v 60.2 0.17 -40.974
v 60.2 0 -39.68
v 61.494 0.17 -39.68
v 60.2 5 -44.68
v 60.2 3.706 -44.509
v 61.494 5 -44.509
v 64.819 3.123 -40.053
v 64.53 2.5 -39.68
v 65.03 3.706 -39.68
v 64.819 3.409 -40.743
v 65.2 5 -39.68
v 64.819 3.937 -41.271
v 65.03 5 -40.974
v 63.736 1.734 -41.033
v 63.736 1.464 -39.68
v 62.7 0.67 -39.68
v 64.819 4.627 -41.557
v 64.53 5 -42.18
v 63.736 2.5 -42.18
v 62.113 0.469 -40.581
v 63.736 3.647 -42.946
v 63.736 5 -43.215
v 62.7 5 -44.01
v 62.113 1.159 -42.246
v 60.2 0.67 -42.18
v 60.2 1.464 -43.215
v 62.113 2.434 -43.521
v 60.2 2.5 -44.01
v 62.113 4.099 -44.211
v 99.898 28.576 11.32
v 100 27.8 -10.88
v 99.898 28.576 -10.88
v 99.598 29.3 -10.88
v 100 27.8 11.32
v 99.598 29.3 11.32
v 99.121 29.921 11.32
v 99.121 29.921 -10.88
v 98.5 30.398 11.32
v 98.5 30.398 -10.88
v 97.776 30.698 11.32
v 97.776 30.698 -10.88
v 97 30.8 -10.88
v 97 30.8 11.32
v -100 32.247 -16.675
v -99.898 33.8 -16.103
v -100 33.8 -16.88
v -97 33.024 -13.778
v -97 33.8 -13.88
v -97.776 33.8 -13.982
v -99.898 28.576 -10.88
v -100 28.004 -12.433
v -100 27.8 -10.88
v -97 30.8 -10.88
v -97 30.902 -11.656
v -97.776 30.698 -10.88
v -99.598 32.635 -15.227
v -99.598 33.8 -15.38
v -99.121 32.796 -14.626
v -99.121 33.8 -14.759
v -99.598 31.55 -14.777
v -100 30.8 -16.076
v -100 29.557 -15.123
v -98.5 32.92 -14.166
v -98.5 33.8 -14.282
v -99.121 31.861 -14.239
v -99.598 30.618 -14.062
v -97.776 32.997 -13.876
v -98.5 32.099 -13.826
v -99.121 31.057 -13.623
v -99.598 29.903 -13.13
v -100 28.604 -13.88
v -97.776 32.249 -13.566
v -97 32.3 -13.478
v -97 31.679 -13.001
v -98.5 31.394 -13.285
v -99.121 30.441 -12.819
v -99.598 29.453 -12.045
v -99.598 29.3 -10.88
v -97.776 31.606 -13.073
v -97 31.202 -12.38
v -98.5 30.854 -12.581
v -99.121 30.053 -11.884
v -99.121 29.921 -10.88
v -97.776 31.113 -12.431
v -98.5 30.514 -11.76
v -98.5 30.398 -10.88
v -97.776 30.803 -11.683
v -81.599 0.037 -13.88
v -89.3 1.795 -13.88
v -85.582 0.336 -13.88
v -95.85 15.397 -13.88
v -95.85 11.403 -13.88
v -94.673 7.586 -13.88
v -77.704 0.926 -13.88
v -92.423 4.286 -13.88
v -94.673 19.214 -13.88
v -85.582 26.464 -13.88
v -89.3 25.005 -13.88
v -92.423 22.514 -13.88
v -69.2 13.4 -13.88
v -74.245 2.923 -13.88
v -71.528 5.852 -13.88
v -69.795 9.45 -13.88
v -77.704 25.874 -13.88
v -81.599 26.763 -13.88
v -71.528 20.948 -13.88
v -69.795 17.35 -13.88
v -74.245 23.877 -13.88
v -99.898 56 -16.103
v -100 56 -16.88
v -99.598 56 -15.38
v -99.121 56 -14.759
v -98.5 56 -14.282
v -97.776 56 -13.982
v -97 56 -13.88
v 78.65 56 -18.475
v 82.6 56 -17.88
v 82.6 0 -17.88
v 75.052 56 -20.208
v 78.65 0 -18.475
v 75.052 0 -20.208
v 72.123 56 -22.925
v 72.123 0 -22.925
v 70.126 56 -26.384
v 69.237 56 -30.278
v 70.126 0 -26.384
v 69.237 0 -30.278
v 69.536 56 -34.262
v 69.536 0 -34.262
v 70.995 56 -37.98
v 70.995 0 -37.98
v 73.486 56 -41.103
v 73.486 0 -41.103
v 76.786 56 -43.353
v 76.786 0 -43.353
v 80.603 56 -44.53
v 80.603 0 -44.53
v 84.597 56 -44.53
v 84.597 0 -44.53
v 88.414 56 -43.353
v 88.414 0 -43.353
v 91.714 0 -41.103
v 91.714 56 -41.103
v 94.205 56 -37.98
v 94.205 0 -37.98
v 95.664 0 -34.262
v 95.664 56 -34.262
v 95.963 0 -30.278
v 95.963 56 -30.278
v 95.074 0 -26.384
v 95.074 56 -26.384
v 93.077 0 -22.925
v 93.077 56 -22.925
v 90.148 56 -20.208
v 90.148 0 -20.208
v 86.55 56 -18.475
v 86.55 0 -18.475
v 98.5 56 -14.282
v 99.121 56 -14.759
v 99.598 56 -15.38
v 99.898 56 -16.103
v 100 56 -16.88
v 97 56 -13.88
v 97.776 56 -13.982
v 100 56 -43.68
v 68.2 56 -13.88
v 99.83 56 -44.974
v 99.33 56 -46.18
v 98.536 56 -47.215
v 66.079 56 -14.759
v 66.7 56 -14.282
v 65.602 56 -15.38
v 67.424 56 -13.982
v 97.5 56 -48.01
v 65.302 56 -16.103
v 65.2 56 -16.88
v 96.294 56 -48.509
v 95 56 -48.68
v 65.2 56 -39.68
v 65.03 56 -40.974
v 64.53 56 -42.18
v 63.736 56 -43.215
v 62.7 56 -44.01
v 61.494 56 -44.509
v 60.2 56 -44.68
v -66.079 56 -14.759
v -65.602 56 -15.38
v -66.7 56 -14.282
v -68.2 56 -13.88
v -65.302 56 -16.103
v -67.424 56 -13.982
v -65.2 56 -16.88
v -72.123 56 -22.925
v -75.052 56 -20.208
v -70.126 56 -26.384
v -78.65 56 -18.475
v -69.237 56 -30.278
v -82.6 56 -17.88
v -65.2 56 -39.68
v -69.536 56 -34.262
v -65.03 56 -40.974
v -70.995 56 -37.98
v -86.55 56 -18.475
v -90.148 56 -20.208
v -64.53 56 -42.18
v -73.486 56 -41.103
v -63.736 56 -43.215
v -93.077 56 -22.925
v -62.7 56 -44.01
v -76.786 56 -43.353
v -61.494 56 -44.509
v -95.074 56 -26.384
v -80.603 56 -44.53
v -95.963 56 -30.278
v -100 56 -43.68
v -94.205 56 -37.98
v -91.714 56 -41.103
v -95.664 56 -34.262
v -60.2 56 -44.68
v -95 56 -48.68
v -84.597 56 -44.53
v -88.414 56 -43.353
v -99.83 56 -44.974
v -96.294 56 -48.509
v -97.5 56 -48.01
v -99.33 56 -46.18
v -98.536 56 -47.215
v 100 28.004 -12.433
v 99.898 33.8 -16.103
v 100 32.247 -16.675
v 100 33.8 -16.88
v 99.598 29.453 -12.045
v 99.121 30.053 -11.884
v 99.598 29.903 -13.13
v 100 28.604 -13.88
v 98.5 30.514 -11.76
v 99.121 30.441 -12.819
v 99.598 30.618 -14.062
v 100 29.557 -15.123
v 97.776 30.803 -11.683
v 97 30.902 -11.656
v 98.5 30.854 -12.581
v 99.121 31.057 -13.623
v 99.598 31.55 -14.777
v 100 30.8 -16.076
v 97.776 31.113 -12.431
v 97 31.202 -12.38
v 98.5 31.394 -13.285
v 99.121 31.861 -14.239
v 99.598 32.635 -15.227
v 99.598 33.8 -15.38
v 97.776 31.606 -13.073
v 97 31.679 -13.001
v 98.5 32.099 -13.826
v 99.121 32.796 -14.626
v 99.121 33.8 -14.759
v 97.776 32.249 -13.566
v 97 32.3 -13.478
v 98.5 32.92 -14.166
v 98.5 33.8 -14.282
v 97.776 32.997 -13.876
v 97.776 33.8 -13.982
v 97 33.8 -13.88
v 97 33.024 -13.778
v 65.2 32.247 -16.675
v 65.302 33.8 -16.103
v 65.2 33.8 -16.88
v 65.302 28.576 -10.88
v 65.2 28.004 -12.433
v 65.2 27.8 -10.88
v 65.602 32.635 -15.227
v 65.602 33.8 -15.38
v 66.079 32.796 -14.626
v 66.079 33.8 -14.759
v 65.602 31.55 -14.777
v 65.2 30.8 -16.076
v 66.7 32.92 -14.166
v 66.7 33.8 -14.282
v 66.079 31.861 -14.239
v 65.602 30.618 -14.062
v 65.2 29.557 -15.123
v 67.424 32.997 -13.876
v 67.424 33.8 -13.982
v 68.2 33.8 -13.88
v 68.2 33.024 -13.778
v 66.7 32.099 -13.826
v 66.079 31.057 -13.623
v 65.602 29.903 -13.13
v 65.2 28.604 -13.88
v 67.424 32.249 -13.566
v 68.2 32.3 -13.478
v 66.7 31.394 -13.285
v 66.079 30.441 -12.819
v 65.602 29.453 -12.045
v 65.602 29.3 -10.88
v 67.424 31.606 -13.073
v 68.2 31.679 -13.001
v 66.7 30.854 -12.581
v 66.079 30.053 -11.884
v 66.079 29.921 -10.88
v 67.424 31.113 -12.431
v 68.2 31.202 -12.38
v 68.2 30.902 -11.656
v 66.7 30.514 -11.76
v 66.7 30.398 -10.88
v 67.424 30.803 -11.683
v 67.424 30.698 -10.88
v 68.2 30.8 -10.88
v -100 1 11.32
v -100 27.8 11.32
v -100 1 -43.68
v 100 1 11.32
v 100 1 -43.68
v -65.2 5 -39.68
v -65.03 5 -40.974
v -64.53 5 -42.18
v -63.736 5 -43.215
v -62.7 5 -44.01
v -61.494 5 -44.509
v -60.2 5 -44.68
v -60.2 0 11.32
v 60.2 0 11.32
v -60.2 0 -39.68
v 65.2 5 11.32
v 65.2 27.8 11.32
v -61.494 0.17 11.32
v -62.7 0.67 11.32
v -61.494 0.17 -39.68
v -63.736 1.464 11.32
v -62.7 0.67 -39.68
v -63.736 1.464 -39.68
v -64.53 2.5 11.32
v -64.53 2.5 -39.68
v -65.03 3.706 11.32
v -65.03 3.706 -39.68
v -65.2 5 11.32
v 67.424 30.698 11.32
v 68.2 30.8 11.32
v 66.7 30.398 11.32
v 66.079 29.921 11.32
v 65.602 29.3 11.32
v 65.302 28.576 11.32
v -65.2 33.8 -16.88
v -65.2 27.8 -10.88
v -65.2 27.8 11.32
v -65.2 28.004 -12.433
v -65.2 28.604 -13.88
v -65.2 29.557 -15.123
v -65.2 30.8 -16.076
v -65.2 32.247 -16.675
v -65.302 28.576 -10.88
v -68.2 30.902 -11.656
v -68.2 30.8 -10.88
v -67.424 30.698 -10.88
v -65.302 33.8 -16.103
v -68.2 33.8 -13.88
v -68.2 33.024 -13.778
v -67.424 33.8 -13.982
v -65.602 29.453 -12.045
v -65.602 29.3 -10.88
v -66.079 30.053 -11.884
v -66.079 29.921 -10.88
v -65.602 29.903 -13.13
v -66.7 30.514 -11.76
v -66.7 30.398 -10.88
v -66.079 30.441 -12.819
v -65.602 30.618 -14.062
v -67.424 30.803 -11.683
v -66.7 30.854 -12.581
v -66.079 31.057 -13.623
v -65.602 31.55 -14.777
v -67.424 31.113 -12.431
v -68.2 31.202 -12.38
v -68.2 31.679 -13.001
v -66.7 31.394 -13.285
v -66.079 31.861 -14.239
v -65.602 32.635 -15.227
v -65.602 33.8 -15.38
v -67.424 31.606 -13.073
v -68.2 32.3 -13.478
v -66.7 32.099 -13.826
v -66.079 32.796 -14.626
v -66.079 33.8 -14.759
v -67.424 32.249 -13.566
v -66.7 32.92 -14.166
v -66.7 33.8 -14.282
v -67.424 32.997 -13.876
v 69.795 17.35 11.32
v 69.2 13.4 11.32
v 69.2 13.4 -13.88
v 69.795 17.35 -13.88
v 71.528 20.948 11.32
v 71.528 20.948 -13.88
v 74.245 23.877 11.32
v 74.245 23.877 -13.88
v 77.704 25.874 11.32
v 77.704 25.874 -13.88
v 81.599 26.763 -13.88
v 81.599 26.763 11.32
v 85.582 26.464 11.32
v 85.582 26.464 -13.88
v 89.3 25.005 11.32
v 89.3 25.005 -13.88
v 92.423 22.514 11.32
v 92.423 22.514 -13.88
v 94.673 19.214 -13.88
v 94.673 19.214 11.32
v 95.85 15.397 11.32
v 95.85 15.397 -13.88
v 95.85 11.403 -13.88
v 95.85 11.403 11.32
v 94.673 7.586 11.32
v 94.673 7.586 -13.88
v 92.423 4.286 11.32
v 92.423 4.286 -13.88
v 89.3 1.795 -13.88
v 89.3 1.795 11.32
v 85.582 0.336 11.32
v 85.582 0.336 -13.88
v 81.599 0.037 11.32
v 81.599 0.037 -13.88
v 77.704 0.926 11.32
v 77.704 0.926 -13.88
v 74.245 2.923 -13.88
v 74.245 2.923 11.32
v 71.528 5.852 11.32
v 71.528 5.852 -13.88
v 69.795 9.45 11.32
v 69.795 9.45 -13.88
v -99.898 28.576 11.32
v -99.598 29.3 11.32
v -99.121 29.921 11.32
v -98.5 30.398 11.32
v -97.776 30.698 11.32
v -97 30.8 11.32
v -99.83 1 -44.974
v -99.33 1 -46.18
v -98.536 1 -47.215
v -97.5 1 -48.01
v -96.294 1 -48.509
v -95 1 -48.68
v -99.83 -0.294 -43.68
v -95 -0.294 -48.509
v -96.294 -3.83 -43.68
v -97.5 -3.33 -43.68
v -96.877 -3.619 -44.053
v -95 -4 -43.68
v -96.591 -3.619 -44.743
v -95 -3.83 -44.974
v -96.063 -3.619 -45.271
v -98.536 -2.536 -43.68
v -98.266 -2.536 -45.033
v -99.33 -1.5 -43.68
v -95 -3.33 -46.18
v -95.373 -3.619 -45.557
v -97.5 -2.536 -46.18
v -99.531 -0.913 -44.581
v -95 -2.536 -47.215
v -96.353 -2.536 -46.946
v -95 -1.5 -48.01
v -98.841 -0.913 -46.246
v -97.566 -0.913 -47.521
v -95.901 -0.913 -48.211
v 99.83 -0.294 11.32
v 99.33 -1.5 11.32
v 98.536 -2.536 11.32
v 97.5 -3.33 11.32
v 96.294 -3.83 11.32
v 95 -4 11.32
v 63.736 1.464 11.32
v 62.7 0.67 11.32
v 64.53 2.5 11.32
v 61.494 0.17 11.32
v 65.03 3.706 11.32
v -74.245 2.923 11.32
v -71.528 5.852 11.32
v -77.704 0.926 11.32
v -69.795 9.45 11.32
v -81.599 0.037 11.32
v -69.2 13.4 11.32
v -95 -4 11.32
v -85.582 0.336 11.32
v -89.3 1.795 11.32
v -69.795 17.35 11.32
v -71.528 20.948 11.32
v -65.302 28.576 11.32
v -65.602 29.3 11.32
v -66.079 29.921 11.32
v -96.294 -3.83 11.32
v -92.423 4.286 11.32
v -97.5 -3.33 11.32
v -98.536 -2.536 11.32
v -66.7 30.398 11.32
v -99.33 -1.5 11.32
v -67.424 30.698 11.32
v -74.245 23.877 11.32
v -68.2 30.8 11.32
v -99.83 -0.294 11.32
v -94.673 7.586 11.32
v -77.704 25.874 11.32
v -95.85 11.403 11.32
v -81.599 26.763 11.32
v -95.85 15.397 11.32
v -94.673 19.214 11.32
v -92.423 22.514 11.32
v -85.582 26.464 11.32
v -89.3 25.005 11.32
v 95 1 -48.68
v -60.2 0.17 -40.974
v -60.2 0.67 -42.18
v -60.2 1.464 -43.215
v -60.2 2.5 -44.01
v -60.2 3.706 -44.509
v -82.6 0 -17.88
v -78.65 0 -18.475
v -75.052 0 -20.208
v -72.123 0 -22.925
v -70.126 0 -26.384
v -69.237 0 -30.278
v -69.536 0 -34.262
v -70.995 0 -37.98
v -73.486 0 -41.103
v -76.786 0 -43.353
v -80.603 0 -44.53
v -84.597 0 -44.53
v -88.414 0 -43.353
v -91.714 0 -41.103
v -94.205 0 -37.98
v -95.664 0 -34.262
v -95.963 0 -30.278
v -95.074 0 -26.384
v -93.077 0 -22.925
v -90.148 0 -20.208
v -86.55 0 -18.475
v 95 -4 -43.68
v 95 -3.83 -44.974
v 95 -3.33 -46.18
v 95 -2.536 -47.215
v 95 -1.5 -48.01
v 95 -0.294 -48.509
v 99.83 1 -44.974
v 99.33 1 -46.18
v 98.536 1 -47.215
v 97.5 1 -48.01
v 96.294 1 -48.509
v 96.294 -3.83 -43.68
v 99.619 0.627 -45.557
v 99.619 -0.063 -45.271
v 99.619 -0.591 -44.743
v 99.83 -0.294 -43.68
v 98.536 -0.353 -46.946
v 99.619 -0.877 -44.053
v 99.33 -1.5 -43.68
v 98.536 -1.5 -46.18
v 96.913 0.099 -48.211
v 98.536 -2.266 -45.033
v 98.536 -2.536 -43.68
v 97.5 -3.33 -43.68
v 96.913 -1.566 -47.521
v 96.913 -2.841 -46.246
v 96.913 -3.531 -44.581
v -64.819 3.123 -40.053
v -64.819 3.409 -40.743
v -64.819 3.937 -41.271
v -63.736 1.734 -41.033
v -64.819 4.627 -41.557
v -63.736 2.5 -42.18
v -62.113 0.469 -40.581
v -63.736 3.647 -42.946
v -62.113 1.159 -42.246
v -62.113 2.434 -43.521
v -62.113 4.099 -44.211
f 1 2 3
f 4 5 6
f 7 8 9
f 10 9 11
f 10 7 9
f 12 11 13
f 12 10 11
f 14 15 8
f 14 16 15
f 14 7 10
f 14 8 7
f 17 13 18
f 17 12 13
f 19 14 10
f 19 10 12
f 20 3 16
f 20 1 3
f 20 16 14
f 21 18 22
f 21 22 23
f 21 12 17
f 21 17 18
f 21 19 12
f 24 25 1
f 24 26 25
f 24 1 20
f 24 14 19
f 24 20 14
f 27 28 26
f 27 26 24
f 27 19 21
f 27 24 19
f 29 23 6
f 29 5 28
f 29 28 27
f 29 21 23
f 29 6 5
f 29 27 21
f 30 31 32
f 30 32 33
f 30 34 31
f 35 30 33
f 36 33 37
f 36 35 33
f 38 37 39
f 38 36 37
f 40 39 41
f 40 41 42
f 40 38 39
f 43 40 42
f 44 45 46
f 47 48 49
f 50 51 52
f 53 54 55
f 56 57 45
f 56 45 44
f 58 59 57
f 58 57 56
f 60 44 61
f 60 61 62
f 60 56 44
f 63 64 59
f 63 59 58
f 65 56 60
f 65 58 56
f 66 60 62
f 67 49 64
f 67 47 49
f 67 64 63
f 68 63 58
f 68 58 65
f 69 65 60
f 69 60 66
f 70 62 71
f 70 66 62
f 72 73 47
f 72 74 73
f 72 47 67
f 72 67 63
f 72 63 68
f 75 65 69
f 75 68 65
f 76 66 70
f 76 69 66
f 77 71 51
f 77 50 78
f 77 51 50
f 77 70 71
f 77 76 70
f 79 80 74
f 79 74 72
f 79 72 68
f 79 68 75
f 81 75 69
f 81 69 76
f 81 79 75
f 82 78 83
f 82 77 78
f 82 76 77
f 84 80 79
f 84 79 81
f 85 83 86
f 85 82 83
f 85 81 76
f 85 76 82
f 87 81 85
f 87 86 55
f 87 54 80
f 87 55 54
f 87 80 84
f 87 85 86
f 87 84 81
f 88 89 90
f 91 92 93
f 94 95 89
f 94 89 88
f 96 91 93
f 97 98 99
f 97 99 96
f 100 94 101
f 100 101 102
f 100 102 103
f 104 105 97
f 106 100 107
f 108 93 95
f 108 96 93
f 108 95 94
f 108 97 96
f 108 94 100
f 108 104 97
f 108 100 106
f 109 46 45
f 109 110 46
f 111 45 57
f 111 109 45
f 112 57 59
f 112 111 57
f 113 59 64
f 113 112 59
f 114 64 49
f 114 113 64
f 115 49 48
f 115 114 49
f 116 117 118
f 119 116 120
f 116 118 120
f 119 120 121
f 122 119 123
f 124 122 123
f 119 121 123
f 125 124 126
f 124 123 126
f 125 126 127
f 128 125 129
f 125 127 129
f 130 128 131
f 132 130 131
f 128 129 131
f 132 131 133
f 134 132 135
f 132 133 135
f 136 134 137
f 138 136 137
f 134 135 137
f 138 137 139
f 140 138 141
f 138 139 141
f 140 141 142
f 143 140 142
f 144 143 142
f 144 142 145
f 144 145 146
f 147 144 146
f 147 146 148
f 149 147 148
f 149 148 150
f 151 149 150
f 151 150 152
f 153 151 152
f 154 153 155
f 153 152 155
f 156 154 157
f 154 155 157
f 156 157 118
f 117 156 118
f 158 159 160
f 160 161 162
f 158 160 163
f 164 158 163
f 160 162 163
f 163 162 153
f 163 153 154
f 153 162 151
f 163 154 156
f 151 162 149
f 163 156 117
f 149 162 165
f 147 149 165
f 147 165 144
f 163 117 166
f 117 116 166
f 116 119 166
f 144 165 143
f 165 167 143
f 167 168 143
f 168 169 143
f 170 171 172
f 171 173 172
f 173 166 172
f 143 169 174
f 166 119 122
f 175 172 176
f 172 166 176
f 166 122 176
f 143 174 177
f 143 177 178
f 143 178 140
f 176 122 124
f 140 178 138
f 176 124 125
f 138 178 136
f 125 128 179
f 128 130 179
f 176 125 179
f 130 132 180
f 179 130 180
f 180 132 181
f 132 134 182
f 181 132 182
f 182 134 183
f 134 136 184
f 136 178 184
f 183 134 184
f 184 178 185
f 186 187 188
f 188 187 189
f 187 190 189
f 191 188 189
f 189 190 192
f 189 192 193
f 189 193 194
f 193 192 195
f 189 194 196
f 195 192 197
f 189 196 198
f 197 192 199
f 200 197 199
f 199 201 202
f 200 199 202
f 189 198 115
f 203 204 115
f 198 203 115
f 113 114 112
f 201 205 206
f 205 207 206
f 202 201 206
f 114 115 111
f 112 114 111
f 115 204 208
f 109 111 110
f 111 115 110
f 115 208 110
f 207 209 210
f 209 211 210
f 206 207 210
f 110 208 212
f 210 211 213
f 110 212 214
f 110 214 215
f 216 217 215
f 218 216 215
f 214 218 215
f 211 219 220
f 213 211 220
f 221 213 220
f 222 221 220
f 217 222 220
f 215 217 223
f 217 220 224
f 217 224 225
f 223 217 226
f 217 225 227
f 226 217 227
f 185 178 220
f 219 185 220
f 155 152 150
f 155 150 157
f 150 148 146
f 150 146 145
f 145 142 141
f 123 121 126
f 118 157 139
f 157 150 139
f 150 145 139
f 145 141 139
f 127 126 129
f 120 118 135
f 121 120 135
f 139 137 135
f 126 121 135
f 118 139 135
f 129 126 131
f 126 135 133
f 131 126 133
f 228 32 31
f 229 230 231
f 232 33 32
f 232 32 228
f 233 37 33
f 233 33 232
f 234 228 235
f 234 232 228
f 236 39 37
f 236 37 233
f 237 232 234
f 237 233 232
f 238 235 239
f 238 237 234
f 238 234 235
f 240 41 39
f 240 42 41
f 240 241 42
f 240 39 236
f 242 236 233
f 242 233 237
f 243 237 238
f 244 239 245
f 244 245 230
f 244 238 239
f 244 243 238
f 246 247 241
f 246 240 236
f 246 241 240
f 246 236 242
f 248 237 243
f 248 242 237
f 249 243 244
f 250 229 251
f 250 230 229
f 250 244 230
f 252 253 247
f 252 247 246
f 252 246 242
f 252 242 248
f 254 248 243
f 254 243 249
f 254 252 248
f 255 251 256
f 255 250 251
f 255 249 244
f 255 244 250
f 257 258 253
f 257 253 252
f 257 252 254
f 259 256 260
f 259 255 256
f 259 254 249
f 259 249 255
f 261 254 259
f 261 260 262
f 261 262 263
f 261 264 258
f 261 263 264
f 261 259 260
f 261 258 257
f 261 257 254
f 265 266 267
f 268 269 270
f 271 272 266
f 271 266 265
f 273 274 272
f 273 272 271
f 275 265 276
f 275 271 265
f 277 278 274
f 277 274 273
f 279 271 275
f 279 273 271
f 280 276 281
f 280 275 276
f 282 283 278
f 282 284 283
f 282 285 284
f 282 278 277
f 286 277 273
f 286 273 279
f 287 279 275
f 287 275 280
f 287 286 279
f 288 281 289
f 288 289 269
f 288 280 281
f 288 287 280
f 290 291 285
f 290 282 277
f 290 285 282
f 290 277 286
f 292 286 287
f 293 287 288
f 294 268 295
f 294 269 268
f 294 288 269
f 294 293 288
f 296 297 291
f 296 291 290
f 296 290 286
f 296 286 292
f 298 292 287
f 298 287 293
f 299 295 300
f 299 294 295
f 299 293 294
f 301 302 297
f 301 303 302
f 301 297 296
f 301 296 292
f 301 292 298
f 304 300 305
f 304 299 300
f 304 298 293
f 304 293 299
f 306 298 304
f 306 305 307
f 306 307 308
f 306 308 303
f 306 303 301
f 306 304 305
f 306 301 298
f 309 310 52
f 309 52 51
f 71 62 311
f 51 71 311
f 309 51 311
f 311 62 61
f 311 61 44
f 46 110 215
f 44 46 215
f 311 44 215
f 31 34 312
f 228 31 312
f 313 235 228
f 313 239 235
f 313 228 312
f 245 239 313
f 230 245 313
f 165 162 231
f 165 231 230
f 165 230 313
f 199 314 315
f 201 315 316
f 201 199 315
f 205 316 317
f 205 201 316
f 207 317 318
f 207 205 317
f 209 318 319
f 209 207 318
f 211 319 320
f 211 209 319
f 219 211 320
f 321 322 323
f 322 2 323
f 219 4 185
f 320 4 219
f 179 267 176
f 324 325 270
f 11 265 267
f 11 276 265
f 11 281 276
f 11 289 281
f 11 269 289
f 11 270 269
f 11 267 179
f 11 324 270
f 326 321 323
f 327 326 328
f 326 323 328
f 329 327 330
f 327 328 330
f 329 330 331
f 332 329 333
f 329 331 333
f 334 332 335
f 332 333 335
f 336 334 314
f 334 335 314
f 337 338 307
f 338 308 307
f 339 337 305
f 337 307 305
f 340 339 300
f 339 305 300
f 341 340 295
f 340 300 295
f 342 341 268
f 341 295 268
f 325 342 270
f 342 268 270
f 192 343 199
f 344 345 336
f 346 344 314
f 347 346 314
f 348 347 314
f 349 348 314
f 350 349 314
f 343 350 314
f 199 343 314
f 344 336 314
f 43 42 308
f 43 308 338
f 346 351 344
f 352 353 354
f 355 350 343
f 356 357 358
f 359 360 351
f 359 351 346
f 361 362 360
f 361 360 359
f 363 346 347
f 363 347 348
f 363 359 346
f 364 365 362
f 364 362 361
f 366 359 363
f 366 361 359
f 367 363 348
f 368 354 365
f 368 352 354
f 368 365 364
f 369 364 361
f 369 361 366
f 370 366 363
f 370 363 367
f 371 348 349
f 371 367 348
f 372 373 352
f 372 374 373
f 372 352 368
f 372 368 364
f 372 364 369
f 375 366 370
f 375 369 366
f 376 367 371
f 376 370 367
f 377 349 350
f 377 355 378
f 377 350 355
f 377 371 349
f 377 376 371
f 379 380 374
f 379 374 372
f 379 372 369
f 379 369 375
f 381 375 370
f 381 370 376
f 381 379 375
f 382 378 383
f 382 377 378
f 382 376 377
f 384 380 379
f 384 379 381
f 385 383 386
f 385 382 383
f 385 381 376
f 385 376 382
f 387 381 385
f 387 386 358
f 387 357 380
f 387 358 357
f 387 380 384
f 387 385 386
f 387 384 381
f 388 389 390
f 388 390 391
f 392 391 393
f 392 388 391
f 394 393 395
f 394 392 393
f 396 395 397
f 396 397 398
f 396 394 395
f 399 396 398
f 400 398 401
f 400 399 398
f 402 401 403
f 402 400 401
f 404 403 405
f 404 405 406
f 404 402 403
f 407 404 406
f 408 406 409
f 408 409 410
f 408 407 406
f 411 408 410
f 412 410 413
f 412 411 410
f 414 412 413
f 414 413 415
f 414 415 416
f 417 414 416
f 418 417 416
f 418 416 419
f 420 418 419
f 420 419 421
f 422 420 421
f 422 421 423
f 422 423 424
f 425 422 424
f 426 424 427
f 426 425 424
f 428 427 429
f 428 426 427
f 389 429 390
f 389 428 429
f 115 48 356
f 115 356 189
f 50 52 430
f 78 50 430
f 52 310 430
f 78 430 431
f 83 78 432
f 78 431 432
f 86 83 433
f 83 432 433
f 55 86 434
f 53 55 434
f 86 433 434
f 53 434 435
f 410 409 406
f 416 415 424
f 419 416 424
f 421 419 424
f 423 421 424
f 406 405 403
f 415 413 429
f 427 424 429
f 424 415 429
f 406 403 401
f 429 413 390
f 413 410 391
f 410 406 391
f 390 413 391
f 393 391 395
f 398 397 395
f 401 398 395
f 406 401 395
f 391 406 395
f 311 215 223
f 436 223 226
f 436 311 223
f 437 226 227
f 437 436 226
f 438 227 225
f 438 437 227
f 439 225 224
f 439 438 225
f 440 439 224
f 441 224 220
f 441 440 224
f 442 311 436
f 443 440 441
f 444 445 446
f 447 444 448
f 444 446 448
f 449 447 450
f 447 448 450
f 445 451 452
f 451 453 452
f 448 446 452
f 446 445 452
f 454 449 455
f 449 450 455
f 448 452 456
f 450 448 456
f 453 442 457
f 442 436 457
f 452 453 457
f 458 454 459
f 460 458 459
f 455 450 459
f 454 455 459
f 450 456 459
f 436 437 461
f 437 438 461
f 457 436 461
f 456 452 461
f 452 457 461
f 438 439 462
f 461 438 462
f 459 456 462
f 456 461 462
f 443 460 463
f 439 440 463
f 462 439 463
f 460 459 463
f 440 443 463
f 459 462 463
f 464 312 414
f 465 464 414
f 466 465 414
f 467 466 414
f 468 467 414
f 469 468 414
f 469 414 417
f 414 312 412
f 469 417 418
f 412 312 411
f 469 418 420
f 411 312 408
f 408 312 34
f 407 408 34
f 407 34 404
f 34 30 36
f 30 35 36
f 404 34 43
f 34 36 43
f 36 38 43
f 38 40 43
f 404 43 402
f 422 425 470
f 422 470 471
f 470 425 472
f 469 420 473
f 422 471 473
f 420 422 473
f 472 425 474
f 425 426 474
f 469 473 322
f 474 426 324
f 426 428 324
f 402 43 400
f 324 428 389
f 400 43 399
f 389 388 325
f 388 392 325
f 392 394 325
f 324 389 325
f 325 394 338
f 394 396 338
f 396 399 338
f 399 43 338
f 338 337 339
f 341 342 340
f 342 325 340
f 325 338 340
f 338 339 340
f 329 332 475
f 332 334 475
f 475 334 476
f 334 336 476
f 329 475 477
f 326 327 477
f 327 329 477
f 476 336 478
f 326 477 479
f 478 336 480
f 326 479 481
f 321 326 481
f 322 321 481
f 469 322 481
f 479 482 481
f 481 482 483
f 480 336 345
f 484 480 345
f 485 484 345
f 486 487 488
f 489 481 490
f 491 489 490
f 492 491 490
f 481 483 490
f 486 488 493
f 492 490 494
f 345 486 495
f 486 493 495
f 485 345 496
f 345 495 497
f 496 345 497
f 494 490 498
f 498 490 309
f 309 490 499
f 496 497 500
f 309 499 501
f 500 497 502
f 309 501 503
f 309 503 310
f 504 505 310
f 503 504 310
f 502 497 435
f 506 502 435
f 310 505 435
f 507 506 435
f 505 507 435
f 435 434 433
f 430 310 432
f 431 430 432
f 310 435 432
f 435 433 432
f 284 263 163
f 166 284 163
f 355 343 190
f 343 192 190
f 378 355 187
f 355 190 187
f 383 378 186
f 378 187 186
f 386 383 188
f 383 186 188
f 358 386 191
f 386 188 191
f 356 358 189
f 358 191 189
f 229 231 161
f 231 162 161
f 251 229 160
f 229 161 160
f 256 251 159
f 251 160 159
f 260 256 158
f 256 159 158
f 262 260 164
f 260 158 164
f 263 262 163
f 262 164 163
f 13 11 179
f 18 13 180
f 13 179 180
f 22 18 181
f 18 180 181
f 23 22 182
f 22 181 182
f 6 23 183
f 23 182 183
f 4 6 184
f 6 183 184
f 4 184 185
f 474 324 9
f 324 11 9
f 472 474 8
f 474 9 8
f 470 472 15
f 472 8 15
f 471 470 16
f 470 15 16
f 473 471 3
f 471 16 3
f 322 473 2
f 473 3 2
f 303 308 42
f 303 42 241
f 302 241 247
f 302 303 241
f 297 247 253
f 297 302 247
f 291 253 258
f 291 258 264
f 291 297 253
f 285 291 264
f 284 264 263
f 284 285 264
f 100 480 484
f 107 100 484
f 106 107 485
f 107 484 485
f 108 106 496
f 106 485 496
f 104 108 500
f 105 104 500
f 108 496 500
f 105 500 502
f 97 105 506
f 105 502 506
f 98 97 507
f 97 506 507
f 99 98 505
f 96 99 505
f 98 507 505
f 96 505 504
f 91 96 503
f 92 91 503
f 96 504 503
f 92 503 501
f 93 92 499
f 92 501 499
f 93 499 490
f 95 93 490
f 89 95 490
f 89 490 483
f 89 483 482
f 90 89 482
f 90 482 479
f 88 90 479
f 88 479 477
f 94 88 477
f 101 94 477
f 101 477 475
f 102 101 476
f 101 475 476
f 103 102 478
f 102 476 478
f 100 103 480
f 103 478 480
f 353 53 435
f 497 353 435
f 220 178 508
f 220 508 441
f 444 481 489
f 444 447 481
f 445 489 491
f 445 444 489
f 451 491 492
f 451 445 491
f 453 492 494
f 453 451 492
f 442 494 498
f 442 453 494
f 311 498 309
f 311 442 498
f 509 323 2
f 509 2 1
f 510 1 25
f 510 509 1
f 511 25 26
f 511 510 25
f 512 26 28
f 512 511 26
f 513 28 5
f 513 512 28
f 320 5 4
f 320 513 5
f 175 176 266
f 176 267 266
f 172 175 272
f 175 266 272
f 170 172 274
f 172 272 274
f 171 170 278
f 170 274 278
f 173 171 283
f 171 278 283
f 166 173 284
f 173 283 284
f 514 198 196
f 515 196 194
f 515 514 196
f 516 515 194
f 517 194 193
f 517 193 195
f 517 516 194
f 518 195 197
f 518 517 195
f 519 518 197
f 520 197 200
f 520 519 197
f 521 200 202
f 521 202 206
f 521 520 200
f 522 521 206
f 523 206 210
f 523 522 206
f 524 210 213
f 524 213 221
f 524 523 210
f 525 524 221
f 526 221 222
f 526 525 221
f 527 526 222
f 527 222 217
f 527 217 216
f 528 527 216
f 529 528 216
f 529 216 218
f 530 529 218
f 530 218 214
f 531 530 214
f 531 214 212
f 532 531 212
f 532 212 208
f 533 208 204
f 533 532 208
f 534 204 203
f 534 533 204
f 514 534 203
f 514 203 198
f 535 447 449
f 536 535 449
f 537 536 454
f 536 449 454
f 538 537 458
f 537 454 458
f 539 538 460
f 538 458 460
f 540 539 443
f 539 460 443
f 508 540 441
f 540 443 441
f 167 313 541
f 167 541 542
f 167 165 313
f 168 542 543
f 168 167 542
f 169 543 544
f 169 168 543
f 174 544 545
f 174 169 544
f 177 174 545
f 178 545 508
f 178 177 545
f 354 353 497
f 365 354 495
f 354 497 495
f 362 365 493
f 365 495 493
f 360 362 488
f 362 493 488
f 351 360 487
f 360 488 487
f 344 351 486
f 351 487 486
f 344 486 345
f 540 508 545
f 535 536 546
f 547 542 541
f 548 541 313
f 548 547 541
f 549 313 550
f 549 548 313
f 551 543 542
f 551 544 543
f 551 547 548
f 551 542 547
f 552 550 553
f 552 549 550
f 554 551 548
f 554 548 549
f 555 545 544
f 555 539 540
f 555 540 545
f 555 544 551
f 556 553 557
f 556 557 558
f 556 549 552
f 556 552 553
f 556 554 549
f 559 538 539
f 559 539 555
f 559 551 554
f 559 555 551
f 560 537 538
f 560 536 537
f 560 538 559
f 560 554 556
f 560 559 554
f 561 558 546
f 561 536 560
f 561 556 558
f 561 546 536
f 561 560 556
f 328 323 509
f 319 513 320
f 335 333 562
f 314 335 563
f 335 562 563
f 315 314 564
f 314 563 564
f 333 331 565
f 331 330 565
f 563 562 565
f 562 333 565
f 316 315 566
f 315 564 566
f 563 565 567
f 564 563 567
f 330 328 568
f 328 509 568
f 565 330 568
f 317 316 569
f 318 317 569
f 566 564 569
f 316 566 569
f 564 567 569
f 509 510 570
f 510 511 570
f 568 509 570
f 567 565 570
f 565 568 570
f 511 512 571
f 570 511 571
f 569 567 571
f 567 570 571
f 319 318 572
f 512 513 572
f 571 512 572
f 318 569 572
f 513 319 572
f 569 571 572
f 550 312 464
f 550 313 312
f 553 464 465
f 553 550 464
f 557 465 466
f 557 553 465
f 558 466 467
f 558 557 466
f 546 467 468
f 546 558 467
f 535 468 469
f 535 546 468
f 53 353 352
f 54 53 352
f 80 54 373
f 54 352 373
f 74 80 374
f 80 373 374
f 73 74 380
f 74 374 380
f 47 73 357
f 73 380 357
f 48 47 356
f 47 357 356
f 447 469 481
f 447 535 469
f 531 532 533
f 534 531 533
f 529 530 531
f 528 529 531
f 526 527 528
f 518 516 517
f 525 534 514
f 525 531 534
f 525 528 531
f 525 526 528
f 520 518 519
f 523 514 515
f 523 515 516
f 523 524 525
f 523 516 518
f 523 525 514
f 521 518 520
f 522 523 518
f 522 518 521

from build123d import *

# Parameters (mm, degrees)
SKETCH1_R           = 13.4
BOSS_EXTRUDE1_DEPTH = 56
SKETCH2_W           = 100
SKETCH2_H           = 60
BOSS_EXTRUDE2_DEPTH = 4
SKETCH3_R           = 13.4
CUT_EXTRUDE1_DEPTH  = 25.2
SKETCH4_W           = 25.2
SKETCH4_H           = 25.2
CUT_EXTRUDE2_DEPTH  = 51.2
FILLET1_R           = 5
FILLET2_R           = 5
FILLET4_R           = 3
FILLET5_R           = 3


with BuildPart() as part:
    # Sketch1 → Boss-Extrude1 (new body)
    with BuildSketch(Plane(origin=(0, 0, 0), x_dir=(1, 0, 0), z_dir=(0, 1, 0))):
        Polygon((-65.2, -11.320132013), (-65.2, 44.679867987), (0, 44.679867987), (0, 48.679867987), (-100, 48.679867987), (-100, -11.320132013), align=None)
        with Locations(Location((-82.6, 31.279867987, 0), (0, 0, 270))):
            Circle(SKETCH1_R, mode=Mode.SUBTRACT)
    boss_extrude1 = extrude(amount=BOSS_EXTRUDE1_DEPTH)

    # Sketch2 → Boss-Extrude2 (add)
    with BuildSketch(Plane(origin=(0, 0, 0), x_dir=(1, 0, 0), z_dir=(0, 1, 0))):
        with Locations((-50, 18.679867987)):
            Rectangle(SKETCH2_W, SKETCH2_H)
    boss_extrude2 = extrude(amount=-BOSS_EXTRUDE2_DEPTH)

    # Sketch3 → Cut-Extrude1 (cut)
    with BuildSketch(Plane.XY.offset(11.320132013)):
        with Locations((-82.6, 13.4)):
            Circle(SKETCH3_R)
    cut_extrude1 = extrude(amount=-CUT_EXTRUDE1_DEPTH, mode=Mode.SUBTRACT)

    # Sketch4 → Cut-Extrude2 (cut)
    with BuildSketch(Plane.ZY.offset(100)):
        with Locations((-1.279867987, 43.4)):
            Rectangle(SKETCH4_W, SKETCH4_H)
    cut_extrude2 = extrude(amount=-CUT_EXTRUDE2_DEPTH, mode=Mode.SUBTRACT)

    # Mirror2: Boss-Extrude1, Boss-Extrude2, Cut-Extrude1, Cut-Extrude2 across plane
    add(boss_extrude1.mirror(Plane.ZY))
    add(boss_extrude2.mirror(Plane.ZY))
    add(cut_extrude1.mirror(Plane.ZY), mode=Mode.SUBTRACT)
    add(cut_extrude2.mirror(Plane.ZY), mode=Mode.SUBTRACT)

    # Fillet1
    fillet1_edges = [part.edges().sort_by_distance(p)[0] for p in [
        (0, 0, -44.679867987),
        (-65.2, 0, -16.679867987),
        (-65.2, 28, -44.679867987),
        (65.2, 0, -16.679867987),
        (65.2, 28, -44.679867987),
    ]]
    fillet(fillet1_edges, radius=FILLET1_R)

    # Fillet2
    fillet2_edges = [part.edges().sort_by_distance(p)[0] for p in [
        (-100, 26, -48.679867987),
        (-100, -4, -18.679867987),
        (0, -4, -48.679867987),
        (100, 26, -48.679867987),
        (100, -4, -18.679867987),
    ]]
    fillet(fillet2_edges, radius=FILLET2_R)

    # Fillet4
    fillet4_edges = [part.edges().sort_by_distance(p)[0] for p in [
        (-65.2, 30.8, -1.279867987),
        (-65.2, 43.4, -13.879867987),
        (-82.6, 30.8, -13.879867987),
        (-100, 43.4, -13.879867987),
        (-100, 30.8, -1.279867987),
    ]]
    fillet(fillet4_edges, radius=FILLET4_R)

    # Fillet5
    fillet5_edges = [part.edges().sort_by_distance(p)[0] for p in [
        (100, 43.4, -13.879867987),
        (82.6, 30.8, -13.879867987),
        (100, 30.8, -1.279867987),
        (65.2, 43.4, -13.879867987),
        (65.2, 30.8, -1.279867987),
    ]]
    fillet(fillet5_edges, radius=FILLET5_R)


solid = part.part
